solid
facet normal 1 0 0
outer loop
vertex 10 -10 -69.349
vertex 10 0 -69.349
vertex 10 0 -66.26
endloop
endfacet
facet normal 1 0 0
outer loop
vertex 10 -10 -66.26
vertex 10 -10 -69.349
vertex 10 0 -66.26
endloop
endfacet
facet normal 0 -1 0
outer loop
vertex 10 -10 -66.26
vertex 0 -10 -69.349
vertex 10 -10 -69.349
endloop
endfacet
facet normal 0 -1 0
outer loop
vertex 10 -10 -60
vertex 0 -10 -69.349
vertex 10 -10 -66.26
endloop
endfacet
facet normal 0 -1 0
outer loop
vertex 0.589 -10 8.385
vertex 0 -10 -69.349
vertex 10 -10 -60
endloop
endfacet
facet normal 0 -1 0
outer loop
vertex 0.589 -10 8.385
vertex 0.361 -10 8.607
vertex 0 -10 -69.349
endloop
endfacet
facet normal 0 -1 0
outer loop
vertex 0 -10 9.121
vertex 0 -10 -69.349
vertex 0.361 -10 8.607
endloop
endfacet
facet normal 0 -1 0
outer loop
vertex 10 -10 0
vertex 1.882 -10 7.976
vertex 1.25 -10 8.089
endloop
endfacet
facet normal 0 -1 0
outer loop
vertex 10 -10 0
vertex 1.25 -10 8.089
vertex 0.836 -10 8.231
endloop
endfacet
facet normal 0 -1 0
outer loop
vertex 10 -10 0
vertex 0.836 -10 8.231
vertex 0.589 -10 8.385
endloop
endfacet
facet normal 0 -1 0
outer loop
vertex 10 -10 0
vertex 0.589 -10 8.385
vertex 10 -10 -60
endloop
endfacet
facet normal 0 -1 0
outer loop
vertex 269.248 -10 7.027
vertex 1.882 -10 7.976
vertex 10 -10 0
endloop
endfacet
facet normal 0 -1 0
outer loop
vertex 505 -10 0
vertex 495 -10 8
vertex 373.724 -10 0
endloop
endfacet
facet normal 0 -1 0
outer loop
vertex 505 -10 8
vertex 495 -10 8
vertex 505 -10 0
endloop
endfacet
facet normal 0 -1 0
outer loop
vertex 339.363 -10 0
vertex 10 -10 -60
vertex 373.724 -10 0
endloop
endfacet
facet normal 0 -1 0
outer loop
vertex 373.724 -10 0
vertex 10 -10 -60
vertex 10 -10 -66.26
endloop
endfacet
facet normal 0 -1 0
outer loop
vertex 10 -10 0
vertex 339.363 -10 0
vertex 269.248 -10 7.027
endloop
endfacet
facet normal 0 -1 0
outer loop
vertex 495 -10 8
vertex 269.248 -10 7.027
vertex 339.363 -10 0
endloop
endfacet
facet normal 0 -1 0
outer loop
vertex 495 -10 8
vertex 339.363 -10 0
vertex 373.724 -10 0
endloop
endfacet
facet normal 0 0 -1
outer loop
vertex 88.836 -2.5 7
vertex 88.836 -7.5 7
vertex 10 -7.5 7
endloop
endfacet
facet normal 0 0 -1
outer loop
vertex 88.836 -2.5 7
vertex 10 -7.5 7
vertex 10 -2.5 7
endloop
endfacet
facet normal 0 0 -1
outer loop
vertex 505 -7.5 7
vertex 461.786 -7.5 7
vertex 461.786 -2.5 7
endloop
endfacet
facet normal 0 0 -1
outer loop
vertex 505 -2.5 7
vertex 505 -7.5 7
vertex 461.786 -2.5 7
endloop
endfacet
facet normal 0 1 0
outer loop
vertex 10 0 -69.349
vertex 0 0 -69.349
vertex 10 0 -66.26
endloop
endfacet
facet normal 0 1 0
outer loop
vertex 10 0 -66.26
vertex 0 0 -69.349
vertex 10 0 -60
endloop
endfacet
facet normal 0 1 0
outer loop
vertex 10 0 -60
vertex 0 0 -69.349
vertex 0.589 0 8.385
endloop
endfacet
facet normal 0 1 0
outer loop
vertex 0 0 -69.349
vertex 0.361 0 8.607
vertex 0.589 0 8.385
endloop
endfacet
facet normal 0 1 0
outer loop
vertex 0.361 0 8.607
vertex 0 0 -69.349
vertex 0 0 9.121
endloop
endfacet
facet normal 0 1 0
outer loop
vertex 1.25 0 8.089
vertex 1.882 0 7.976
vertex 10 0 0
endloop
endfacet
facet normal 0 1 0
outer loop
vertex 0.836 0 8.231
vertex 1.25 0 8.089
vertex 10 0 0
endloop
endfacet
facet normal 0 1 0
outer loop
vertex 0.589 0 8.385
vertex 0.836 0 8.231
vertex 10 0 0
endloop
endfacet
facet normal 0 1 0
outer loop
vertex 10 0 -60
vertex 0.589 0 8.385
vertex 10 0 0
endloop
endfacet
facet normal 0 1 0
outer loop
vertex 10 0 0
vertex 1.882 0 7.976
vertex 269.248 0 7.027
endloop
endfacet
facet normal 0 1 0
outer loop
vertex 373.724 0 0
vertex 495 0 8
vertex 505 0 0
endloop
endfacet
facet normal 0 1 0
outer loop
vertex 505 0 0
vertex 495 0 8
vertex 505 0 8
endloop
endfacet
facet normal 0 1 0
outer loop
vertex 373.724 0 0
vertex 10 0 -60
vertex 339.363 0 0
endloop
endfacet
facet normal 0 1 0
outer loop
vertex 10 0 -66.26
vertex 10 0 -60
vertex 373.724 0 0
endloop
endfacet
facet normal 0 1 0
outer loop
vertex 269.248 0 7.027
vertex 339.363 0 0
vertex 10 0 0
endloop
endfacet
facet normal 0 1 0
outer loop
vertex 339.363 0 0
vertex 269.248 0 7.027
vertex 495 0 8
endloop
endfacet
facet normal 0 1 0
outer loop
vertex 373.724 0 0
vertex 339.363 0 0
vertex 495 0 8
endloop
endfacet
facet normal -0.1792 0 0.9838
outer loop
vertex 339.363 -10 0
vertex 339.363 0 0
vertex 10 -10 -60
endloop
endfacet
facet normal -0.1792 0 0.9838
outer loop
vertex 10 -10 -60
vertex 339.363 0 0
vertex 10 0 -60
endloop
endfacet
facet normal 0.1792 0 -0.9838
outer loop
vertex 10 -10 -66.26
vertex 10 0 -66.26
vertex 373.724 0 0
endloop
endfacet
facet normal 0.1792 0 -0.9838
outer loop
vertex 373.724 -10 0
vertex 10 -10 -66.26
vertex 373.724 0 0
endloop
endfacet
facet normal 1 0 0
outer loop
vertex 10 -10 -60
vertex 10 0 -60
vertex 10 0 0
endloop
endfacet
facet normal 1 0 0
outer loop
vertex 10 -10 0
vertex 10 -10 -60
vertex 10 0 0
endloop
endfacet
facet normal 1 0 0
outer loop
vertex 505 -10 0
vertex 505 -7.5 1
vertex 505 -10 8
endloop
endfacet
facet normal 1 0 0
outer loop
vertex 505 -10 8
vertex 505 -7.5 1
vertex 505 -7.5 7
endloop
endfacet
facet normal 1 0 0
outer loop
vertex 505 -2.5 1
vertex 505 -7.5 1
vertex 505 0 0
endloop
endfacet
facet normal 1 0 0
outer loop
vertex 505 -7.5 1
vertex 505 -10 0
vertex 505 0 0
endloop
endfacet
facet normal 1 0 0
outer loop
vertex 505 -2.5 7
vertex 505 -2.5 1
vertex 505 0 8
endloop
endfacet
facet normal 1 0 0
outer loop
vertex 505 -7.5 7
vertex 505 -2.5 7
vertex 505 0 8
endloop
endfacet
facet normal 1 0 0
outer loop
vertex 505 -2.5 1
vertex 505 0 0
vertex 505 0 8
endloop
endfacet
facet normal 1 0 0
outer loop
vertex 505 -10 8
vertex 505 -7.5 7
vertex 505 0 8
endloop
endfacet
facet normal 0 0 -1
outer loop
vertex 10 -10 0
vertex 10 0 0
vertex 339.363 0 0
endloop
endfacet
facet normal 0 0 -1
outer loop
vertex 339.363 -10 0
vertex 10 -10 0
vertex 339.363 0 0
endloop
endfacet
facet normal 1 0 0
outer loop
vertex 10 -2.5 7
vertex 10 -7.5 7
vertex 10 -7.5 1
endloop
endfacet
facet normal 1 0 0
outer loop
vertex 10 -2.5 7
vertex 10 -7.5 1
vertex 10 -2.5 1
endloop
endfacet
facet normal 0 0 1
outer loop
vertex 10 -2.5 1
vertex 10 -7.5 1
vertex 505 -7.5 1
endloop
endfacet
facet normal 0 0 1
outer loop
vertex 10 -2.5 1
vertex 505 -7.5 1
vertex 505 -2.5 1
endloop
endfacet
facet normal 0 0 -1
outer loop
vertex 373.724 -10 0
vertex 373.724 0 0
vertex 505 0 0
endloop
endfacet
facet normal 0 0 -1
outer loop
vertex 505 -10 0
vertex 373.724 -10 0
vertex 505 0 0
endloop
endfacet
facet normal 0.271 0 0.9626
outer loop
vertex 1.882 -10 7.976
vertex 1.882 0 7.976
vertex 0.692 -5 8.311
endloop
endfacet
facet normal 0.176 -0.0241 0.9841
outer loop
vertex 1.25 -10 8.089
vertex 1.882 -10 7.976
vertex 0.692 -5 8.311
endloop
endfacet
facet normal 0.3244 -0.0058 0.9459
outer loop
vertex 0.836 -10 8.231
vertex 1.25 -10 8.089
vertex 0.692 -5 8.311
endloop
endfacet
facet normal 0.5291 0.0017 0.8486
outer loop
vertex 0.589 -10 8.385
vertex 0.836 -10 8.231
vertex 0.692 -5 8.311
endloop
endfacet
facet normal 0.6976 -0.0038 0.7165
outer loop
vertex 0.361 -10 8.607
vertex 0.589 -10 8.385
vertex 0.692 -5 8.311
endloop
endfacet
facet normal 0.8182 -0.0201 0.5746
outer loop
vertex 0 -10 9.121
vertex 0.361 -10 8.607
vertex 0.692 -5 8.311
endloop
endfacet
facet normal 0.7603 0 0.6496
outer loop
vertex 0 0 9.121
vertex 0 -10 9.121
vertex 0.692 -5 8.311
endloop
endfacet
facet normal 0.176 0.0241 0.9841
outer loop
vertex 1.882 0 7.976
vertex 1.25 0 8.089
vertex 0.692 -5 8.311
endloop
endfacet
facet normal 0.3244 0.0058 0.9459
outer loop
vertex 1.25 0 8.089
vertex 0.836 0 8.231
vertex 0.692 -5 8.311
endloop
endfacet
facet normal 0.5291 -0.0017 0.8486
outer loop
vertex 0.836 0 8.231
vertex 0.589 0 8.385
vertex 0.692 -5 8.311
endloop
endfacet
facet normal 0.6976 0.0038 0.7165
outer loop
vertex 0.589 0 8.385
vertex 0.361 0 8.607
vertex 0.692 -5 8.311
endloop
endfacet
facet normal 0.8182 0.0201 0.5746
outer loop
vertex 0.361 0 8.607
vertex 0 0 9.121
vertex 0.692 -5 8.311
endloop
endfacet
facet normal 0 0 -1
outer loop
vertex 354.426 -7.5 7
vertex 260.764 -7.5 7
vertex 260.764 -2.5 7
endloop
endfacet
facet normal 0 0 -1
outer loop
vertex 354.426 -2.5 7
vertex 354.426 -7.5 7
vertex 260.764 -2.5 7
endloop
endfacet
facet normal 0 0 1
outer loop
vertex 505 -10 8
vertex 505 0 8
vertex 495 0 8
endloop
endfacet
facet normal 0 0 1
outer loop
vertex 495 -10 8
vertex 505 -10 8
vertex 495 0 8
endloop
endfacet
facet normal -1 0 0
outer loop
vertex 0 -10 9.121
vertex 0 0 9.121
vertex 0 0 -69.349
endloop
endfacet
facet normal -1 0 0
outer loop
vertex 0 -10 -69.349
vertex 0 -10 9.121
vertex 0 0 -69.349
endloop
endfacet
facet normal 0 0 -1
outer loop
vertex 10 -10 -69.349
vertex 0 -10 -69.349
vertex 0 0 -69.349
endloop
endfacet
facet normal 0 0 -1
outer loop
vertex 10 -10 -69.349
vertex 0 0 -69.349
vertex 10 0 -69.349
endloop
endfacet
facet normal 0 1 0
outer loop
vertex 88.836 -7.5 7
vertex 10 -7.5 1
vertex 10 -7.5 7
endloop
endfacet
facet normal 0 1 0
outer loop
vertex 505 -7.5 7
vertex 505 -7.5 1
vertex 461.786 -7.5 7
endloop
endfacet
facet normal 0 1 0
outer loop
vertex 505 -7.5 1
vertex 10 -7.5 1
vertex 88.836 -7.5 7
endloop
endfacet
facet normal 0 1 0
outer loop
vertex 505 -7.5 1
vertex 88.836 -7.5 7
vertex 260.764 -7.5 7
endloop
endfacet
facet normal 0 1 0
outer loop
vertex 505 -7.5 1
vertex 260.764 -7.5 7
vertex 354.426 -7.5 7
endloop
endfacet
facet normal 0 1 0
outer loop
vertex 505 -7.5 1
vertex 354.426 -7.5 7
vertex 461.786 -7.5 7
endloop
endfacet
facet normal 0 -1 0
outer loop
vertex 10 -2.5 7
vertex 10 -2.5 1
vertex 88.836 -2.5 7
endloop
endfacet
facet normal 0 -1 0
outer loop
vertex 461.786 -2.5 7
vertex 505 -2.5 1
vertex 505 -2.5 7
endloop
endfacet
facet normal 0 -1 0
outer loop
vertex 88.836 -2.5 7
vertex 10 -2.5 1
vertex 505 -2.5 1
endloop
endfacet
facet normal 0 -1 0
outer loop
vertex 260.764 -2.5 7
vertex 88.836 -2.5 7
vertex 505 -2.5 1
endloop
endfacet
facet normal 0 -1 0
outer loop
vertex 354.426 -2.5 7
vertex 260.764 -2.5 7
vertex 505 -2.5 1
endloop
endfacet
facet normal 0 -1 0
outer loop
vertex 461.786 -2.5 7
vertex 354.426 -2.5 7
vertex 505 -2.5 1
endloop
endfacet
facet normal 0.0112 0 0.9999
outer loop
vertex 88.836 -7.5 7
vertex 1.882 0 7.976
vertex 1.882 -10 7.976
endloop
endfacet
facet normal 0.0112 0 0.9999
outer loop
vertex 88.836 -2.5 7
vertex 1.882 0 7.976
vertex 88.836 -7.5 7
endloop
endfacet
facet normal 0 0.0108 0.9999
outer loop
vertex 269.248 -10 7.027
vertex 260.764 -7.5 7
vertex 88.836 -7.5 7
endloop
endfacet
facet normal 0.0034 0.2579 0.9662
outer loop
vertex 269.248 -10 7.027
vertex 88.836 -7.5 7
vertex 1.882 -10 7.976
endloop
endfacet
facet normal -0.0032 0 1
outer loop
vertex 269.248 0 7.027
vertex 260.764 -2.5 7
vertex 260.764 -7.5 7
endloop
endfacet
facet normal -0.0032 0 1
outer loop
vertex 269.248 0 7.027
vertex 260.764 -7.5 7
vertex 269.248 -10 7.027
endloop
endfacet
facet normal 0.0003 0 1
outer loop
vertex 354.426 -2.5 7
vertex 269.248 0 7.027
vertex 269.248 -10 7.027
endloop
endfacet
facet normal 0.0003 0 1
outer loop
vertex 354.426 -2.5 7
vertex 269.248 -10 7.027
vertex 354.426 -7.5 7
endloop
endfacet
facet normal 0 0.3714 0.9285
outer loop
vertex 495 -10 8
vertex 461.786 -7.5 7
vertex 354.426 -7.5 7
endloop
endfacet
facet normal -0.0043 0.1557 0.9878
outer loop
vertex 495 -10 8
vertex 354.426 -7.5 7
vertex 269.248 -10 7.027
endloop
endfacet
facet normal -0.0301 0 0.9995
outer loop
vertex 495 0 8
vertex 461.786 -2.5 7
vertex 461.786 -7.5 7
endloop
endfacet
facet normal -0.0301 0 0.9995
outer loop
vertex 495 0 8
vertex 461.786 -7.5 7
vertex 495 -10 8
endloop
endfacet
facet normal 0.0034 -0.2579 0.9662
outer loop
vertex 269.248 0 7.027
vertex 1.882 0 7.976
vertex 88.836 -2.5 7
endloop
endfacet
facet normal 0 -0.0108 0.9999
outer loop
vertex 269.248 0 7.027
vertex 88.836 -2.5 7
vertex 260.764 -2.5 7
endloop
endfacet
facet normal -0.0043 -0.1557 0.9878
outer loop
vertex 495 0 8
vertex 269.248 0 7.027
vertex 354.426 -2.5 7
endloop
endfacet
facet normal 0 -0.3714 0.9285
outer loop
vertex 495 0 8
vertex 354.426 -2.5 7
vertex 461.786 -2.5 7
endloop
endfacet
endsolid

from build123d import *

# Parameters (mm, degrees)
F1_DEPTH = 10
F2_W     = 5
F2_H     = 6
F3_DEPTH = 495
F4_W     = 10
F4_H     = 10.6507557631
F5_DEPTH = 25


with BuildPart() as f1:
    # F0 (on Front) → F1 (new body)
    with BuildSketch(Plane.XZ):
        with BuildLine():
            Line((0, 8), (0, 0))
            Line((0, 0), (0, -80))
            Line((0, -80), (10, -80))
            Line((10, -80), (10, -66.2595003911))
            Line((10, -66.2595003911), (373.7241029739, 0))
            Line((373.7241029739, 0), (505, 0))
            Line((505, 0), (505, 8))
            Line((505, 8), (495, 8))
            add(Edge.make_bspline(
                [(1.8815460355, 7.9757237206), (41.9158968697, 7.4592539668), (121.7303576786, 6.4418774159), (248.8795131648, 6.9843016), (337.5487991179, 7.2325436144), (457.5810815868, 6.3868246941), (483.8835547527, 7.5984463681), (495, 8)],
                knots=[0.0035028054, 0.0035028054, 0.0035028054, 0.0035028054, 0.2271440961, 0.4556460712, 0.6558474221, 0.8763222147, 1, 1, 1, 1], degree=3))
            add(Edge.make_bspline(
                [(0, 8), (0.627325076, 7.9919054957), (1.2545037706, 7.9838129829), (1.8815460355, 7.9757237206)],
                knots=[0, 0, 0, 0, 0.0035028054, 0.0035028054, 0.0035028054, 0.0035028054], degree=3))
        make_face()
        Polygon((10, -60), (10, 0), (339.3632769585, 0), align=None, mode=Mode.SUBTRACT)
        with BuildLine():
            Line((0, 9.1209262609), (0, 8))
            add(Edge.make_bspline(
                [(0, 8), (0.627325076, 7.9919054957), (1.2545037706, 7.9838129829), (1.8815460355, 7.9757237206)],
                knots=[0, 0, 0, 0, 0.0035028054, 0.0035028054, 0.0035028054, 0.0035028054], degree=3))
            add(Edge.make_bspline(
                [(1.8815460355, 7.9757237206), (1.4466139308, 8.041002586), (0.6078738326, 8.1668889057), (0.1975491446, 8.8108795813), (0, 9.1209262609)],
                knots=[0, 0, 0, 0, 0.5185540858, 1, 1, 1, 1], degree=3))
        make_face()
    extrude(amount=F1_DEPTH)

    # F2 (on face) → F3 (cut)
    with BuildSketch(Plane.YZ.offset(505)):
        with Locations((-5, 4)):
            Rectangle(F2_W, F2_H)
    extrude(amount=-F3_DEPTH, mode=Mode.SUBTRACT)

    # F4 (on face) → F5 (cut)
    with BuildSketch(Plane.XZ.offset(10)):
        with Locations((5, -74.6746221185)):
            Rectangle(F4_W, F4_H)
    extrude(amount=-F5_DEPTH, mode=Mode.SUBTRACT)


solid = f1.part
